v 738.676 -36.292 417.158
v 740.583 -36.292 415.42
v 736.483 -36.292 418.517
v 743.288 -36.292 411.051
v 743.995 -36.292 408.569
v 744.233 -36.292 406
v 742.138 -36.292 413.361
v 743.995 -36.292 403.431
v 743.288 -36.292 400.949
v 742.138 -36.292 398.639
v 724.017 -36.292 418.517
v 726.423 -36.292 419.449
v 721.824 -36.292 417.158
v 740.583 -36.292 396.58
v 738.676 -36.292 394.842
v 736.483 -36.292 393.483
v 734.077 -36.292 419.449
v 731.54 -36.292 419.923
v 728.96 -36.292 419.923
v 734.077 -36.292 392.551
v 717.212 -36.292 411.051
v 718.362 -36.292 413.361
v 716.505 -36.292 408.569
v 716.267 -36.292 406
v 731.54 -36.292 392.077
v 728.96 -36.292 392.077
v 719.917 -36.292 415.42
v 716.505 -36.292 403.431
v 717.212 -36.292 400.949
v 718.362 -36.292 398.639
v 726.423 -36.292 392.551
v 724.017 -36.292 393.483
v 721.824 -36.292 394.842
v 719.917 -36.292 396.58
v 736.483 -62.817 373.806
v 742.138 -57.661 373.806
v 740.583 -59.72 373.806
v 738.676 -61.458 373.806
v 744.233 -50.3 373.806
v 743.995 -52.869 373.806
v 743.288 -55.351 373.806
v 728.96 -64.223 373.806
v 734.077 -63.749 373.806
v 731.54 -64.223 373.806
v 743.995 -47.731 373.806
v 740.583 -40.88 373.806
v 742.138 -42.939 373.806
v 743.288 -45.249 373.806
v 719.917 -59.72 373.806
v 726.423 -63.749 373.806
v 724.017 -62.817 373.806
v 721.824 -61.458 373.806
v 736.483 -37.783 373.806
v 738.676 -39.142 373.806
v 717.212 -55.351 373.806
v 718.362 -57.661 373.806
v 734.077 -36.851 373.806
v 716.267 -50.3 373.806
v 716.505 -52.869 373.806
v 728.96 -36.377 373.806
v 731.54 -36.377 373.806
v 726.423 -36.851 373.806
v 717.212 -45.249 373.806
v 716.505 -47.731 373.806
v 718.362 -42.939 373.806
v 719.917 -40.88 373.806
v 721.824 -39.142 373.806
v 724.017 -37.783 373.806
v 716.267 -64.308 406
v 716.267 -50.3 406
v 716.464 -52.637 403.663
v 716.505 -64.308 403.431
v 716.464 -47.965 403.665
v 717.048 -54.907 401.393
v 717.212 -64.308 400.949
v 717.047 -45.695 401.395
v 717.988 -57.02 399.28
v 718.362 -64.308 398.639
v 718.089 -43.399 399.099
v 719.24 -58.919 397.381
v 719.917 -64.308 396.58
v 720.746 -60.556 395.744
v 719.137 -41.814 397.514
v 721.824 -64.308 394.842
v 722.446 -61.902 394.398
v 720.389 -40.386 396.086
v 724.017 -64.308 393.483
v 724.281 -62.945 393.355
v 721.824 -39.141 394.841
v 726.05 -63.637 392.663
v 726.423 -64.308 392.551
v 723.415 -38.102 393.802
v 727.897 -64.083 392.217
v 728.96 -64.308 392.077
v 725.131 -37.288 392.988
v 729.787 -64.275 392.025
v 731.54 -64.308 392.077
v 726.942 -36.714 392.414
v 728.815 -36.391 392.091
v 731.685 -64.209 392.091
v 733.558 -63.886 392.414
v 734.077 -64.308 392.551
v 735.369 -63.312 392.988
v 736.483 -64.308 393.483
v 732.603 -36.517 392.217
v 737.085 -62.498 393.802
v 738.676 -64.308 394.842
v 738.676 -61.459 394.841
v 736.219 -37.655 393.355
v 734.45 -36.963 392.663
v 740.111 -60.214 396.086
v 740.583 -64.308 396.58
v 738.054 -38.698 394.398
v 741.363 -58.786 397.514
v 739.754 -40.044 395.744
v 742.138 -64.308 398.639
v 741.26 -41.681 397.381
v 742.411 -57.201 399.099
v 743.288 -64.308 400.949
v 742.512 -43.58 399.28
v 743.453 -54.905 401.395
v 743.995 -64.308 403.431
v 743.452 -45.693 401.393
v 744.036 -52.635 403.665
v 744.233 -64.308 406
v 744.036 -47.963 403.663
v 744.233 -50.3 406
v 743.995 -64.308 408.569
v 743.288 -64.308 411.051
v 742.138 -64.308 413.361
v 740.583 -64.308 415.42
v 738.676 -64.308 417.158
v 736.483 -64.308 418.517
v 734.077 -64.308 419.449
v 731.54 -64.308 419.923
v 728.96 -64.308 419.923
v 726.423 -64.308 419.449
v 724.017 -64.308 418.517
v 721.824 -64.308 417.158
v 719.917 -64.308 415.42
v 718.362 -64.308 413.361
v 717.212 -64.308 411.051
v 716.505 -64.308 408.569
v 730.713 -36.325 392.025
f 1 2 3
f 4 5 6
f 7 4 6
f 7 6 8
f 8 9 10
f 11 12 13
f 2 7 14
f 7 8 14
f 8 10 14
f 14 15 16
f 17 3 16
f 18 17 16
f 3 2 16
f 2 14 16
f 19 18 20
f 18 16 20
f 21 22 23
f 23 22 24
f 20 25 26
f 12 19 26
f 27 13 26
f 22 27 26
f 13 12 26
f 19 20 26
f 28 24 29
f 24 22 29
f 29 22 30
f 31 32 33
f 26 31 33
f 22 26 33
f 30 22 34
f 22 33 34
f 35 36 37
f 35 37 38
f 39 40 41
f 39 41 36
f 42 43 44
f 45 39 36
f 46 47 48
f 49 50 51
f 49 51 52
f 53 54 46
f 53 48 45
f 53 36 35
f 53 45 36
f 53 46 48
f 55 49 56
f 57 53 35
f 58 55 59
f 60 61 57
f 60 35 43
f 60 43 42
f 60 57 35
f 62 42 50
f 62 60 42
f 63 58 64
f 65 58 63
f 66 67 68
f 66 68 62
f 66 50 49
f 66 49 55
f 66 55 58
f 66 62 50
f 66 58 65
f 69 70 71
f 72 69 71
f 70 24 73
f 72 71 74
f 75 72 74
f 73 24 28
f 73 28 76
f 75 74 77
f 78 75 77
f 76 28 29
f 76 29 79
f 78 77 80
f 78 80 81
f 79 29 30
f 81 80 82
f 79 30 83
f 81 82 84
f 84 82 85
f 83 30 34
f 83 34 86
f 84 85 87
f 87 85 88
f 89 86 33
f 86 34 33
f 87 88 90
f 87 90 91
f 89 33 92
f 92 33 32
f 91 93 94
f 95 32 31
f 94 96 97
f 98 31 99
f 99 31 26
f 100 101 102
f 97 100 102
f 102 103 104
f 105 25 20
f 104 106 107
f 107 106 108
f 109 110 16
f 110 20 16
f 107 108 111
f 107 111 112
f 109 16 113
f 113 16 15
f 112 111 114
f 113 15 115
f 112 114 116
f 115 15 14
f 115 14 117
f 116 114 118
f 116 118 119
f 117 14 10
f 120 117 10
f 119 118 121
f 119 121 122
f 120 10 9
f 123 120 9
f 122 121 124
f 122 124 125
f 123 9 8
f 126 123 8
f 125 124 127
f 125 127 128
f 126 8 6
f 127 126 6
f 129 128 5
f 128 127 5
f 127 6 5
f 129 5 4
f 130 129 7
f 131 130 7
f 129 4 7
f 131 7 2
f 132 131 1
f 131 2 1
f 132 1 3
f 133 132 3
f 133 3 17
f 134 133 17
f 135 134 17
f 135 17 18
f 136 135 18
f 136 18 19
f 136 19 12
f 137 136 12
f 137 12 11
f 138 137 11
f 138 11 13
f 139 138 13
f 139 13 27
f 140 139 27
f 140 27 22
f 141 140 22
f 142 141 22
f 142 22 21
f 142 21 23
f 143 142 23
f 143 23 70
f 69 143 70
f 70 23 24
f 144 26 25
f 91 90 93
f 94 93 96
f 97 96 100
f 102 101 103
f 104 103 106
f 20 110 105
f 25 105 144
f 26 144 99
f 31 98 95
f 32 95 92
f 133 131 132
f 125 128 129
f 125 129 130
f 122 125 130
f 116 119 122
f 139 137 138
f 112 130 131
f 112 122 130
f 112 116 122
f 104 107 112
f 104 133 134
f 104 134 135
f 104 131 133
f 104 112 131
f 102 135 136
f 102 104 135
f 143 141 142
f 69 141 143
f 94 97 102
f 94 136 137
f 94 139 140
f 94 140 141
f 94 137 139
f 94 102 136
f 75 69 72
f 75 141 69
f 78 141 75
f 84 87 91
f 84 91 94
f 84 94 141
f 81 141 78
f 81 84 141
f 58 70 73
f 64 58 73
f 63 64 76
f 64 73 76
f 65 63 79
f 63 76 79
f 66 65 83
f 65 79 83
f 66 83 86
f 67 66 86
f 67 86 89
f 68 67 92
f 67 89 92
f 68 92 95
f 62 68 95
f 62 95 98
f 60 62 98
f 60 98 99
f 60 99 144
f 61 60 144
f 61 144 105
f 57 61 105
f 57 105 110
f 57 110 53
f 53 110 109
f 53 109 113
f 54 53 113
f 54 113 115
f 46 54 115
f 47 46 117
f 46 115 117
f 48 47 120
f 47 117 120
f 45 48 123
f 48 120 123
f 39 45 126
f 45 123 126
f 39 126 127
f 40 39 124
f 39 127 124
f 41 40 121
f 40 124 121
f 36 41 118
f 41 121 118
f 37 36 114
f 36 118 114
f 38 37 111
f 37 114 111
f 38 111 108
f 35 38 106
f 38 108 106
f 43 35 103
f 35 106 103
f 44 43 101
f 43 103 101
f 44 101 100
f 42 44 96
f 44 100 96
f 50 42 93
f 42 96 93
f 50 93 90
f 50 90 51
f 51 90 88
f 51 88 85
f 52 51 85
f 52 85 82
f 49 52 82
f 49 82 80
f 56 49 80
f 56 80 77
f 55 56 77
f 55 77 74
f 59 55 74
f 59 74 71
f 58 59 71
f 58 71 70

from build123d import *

# Parameters (mm, degrees)
CYLINDER024_R             = 13.9827
CYLINDER024_DEPTH         = 28.0162
CYLINDER023_R             = 13.9827
CYLINDER023_DEPTH         = 32.1945
FUSION011_PLACEMENT_ANGLE = 180


with BuildPart() as cylinder024:
    # Cylinder024 → Cylinder024 (new body)
    with BuildSketch(Plane.XZ.offset(-14.0081)):
        Circle(CYLINDER024_R)
    extrude(amount=CYLINDER024_DEPTH)


with BuildPart() as front_slip_l:
    # Cylinder023 → Cylinder023 (new body)
    with BuildSketch(Plane.XY):
        Circle(CYLINDER023_R)
    extrude(amount=CYLINDER023_DEPTH)

    # Fusion011: union Cylinder024
    add(cylinder024.part)


with BuildPart() as front_slip_l_1:
    # Fusion011 placement: moved
    add(front_slip_l.part.moved(Location((730.25, -50.3, 406))).rotate(Axis((730.25, -50.3, 406), (0, 1, 0)), FUSION011_PLACEMENT_ANGLE))


solid = front_slip_l_1.part
